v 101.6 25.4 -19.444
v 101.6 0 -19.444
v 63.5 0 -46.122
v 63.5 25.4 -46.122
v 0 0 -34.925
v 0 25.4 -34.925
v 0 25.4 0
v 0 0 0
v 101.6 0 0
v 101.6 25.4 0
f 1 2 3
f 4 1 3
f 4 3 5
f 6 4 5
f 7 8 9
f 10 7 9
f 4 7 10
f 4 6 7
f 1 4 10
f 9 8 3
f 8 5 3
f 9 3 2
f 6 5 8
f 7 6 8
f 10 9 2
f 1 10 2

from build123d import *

# Parameters (mm, degrees)
SALIENTE_EXTRUIR1_DEPTH = 25.4


with BuildPart() as part:
    # Croquis2 → Saliente-Extruir1 (new body)
    with BuildSketch(Plane(origin=(0, 0, 0), x_dir=(1, 0, 0), z_dir=(0, 1, 0))):
        Polygon((0, 0), (101.6, 0), (101.6, 19.443856069), (63.5, 46.121763275), (0, 34.925), align=None)
    extrude(amount=SALIENTE_EXTRUIR1_DEPTH)


solid = part.part
